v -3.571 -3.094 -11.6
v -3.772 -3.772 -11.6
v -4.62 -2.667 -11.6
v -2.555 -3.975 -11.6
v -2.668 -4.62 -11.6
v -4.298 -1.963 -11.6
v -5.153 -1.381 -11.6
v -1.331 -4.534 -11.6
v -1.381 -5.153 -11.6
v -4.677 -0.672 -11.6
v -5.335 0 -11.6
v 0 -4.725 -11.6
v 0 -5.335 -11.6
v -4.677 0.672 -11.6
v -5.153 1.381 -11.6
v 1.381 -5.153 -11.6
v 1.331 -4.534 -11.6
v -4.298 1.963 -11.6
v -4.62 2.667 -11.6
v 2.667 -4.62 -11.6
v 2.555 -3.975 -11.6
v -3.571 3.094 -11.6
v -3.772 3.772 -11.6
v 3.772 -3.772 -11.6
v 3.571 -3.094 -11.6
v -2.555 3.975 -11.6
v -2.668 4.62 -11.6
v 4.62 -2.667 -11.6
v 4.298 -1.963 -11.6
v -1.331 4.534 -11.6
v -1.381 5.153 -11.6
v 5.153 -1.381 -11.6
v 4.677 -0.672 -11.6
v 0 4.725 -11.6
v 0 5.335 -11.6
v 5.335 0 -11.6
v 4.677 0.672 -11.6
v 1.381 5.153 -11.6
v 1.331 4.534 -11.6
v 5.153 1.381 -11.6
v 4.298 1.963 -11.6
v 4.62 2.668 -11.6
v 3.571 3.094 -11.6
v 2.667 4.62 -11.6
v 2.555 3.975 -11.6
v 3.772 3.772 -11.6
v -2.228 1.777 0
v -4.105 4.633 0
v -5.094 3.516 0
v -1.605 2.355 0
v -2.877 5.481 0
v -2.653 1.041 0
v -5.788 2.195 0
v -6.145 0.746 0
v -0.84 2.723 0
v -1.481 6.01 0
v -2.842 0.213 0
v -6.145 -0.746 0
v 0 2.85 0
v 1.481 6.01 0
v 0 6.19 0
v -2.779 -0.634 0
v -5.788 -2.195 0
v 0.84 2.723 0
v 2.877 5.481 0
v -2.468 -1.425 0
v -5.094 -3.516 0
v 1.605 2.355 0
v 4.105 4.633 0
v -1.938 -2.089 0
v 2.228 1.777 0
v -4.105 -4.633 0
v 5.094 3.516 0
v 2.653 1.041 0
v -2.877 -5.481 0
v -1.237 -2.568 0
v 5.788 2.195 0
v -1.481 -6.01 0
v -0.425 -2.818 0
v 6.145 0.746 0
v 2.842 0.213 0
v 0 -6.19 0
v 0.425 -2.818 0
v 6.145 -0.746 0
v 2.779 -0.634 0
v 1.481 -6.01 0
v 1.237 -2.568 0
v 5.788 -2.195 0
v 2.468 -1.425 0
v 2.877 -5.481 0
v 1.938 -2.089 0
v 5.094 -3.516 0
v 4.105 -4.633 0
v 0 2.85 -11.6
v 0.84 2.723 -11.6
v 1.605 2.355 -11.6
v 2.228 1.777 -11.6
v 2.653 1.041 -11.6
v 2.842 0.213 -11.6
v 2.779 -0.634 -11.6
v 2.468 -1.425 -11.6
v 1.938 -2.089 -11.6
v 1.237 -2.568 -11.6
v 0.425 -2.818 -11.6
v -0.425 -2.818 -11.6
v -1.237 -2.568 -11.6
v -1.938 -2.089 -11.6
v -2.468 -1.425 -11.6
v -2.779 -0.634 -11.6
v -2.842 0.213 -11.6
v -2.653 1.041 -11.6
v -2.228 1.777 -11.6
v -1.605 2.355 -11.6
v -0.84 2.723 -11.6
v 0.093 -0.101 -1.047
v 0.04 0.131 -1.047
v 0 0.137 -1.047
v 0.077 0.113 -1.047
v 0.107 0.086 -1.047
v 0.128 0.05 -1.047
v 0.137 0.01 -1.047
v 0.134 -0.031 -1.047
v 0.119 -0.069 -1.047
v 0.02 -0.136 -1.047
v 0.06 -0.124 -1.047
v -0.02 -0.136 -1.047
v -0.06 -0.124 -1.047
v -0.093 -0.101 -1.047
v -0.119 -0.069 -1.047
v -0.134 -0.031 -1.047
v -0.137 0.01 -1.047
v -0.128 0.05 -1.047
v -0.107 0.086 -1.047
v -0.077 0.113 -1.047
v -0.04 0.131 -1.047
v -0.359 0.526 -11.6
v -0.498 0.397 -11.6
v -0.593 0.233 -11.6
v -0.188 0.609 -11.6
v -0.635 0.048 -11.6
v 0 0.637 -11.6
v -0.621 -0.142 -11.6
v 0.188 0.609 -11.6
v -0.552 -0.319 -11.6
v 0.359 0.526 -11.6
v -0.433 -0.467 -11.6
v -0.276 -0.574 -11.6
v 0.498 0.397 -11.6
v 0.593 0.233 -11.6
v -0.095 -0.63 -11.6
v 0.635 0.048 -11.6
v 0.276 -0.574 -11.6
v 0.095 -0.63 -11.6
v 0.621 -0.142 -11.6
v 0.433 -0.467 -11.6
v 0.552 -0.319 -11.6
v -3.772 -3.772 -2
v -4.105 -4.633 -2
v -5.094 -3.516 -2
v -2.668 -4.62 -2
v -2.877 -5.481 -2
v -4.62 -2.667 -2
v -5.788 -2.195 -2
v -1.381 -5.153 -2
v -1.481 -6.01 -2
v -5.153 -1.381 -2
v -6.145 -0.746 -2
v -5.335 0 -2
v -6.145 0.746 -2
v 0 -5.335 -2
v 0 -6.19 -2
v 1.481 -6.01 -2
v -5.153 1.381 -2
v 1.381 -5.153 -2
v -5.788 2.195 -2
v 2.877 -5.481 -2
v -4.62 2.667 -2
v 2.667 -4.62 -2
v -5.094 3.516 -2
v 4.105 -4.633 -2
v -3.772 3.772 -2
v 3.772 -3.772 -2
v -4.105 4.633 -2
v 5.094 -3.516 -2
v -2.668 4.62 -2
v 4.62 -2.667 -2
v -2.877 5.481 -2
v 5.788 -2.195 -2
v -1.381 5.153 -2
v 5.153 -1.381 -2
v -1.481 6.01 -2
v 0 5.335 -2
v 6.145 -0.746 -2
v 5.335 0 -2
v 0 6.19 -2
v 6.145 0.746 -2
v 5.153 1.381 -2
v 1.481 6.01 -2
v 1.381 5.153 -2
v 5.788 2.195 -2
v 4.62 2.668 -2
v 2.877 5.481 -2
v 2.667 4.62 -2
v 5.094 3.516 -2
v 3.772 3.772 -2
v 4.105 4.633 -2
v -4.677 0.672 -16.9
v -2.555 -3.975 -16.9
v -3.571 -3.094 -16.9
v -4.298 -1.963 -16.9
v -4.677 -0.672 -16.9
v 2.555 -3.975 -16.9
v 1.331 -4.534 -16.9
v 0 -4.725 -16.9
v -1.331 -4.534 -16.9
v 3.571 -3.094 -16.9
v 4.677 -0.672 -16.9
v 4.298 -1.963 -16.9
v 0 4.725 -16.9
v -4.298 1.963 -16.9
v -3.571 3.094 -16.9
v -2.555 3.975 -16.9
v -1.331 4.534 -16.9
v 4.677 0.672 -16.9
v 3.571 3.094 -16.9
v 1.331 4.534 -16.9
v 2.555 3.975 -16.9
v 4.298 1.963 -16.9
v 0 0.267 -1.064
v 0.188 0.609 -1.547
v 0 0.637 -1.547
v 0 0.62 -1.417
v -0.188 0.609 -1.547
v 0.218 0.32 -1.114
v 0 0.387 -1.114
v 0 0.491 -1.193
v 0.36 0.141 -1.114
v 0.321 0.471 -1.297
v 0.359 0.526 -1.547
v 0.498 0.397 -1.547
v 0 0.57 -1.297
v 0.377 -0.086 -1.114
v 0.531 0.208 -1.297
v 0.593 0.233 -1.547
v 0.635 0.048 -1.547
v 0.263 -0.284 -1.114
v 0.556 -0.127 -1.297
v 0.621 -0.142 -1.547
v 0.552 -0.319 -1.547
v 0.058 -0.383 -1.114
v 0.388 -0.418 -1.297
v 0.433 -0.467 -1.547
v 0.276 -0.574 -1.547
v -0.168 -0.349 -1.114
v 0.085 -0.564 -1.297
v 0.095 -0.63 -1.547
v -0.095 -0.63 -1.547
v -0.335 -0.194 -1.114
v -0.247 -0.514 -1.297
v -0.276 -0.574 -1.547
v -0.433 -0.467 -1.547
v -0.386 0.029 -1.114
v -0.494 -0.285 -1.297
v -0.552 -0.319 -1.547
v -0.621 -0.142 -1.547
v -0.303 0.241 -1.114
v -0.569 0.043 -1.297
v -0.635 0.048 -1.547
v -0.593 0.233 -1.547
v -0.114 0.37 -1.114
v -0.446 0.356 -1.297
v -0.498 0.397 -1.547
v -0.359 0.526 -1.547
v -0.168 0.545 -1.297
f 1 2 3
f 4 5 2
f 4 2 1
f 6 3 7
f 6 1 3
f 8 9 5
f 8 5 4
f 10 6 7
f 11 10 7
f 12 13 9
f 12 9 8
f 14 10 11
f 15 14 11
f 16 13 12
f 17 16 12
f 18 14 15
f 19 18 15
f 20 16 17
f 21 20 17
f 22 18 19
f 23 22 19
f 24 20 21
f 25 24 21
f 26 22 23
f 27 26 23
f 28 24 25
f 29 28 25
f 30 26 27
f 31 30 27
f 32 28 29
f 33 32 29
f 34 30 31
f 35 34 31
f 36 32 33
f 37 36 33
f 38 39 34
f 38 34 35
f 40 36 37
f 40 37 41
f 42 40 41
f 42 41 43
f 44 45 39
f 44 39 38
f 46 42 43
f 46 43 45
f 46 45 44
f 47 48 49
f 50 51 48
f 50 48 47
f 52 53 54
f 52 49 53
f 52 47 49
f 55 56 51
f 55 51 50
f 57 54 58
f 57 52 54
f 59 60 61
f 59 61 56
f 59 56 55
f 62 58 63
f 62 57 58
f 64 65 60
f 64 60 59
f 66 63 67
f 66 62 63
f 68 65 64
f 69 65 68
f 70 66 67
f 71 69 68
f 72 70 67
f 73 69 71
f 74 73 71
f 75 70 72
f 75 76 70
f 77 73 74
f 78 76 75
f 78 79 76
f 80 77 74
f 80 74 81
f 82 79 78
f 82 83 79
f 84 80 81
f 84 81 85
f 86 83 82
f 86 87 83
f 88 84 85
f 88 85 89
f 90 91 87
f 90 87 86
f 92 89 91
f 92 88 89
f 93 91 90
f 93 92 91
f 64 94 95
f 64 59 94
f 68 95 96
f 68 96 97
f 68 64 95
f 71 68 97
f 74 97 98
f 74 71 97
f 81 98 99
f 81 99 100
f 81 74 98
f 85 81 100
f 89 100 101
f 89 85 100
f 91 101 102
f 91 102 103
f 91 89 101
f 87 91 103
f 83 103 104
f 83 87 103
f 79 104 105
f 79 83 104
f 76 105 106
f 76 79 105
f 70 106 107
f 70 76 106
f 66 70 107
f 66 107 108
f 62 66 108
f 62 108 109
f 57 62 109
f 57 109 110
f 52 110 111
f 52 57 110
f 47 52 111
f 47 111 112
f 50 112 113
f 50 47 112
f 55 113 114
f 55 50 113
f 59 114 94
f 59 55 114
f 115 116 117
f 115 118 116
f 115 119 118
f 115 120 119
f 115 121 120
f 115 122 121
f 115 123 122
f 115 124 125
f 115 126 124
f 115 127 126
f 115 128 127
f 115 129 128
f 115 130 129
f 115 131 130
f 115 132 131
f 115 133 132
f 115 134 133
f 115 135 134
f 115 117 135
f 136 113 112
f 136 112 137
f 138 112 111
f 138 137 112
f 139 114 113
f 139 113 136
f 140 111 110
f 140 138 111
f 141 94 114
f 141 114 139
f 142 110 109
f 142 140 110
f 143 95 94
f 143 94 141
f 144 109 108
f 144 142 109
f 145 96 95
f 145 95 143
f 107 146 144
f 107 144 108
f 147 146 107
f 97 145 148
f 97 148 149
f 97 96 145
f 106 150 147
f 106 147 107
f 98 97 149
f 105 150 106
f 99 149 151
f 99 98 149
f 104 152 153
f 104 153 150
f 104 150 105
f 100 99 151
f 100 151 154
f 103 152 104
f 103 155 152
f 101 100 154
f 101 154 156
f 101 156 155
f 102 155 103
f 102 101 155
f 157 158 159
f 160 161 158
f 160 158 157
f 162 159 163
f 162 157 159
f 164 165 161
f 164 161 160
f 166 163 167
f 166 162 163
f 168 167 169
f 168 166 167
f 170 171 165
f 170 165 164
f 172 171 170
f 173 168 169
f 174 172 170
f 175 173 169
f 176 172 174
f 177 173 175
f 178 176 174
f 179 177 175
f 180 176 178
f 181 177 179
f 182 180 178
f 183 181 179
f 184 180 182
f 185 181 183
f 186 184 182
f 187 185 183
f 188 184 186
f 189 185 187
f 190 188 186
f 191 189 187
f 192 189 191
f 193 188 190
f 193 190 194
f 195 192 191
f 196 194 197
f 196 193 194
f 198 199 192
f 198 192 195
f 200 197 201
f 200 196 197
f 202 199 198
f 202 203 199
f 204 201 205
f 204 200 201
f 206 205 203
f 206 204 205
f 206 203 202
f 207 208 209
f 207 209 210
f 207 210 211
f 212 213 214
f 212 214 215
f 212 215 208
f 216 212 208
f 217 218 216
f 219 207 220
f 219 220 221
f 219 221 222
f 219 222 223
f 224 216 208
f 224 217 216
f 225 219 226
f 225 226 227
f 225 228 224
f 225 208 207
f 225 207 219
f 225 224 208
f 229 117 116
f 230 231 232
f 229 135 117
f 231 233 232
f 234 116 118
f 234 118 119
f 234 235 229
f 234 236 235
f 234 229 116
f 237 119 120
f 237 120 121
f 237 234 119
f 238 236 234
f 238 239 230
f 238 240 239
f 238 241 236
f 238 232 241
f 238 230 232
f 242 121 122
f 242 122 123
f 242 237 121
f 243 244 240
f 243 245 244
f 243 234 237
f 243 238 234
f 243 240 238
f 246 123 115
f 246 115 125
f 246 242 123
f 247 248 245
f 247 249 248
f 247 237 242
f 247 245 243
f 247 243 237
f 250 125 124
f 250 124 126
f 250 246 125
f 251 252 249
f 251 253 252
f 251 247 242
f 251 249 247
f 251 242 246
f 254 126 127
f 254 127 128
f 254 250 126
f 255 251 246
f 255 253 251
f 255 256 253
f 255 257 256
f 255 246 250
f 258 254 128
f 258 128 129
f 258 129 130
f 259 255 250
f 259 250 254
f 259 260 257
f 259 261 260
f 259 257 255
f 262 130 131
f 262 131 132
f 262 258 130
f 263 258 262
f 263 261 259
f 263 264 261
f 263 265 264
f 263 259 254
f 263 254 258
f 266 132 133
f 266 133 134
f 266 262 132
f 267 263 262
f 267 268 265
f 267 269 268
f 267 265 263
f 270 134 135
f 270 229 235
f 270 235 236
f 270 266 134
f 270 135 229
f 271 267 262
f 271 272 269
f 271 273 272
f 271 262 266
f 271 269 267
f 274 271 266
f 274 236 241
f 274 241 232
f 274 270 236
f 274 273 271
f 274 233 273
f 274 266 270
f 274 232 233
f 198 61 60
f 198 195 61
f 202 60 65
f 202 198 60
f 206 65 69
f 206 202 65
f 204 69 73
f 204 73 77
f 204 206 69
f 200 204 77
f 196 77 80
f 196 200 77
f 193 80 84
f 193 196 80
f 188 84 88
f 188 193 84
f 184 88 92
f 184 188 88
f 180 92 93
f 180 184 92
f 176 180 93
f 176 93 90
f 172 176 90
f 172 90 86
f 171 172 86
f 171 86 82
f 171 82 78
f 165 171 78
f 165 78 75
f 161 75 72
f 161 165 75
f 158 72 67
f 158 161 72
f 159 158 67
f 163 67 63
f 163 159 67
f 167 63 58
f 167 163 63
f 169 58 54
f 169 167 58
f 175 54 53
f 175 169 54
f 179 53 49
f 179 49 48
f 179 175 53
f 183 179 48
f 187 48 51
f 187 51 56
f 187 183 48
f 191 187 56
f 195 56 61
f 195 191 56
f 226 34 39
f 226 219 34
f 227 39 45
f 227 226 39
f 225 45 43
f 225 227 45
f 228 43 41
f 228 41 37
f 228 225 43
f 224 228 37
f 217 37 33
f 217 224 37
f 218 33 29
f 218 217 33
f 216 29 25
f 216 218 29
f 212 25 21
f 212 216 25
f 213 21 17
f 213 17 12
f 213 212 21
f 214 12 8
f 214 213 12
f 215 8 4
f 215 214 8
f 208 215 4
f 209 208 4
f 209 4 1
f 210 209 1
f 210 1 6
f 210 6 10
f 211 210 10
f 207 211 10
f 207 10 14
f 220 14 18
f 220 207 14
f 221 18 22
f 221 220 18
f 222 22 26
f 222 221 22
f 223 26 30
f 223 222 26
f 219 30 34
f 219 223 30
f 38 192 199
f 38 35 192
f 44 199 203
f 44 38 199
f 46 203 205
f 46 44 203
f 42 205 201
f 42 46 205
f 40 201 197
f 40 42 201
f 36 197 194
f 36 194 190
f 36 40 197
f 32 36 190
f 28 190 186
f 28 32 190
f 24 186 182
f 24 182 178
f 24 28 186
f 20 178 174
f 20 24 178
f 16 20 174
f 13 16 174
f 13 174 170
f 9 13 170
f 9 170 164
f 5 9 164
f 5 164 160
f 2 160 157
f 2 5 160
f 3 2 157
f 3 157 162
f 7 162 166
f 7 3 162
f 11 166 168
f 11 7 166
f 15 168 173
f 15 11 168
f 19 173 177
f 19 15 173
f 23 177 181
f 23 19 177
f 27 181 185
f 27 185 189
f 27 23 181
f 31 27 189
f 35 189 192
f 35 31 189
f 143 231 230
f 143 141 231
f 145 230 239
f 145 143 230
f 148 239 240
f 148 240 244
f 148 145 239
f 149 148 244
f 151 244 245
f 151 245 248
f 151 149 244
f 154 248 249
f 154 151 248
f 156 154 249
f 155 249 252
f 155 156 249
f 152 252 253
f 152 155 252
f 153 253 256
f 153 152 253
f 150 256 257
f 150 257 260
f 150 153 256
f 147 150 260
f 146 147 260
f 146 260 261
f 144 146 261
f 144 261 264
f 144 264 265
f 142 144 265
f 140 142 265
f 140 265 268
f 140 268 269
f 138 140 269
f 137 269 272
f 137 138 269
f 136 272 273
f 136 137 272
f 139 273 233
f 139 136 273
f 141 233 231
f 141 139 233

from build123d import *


with BuildPart() as part:
    # Sketch1 → Revolve1 (revolve)
    with BuildSketch(Plane(origin=(0, 0, 0), x_dir=(0, 0, -1), z_dir=(1, 0, 0))):
        with BuildLine():
            Line((0, 2.85), (0, 6.19))
            Line((0, 6.19), (2, 6.19))
            Line((2, 6.19), (2, 5.335))
            Line((2, 5.335), (11.6, 5.335))
            Line((11.6, 5.335), (11.6, 4.725))
            Line((11.6, 4.725), (16.9, 4.725))
            Line((16.9, 4.725), (16.9, 0))
            Line((16.9, 0), (1.046838235, 0))
            Line((1.046838235, 0), (1.046838235, 0.137205882))
            ThreePointArc((1.046838235, 0.137205882), (1.193284845, 0.490759273), (1.546838235, 0.637205882))
            Line((1.546838235, 0.637205882), (11.6, 0.637205882))
            Line((11.6, 0.637205882), (11.6, 2.85))
            Line((11.6, 2.85), (0, 2.85))
        make_face()
    revolve(axis=Axis((0, 0, 5.006617647), (0, 0, -1)))


solid = part.part
